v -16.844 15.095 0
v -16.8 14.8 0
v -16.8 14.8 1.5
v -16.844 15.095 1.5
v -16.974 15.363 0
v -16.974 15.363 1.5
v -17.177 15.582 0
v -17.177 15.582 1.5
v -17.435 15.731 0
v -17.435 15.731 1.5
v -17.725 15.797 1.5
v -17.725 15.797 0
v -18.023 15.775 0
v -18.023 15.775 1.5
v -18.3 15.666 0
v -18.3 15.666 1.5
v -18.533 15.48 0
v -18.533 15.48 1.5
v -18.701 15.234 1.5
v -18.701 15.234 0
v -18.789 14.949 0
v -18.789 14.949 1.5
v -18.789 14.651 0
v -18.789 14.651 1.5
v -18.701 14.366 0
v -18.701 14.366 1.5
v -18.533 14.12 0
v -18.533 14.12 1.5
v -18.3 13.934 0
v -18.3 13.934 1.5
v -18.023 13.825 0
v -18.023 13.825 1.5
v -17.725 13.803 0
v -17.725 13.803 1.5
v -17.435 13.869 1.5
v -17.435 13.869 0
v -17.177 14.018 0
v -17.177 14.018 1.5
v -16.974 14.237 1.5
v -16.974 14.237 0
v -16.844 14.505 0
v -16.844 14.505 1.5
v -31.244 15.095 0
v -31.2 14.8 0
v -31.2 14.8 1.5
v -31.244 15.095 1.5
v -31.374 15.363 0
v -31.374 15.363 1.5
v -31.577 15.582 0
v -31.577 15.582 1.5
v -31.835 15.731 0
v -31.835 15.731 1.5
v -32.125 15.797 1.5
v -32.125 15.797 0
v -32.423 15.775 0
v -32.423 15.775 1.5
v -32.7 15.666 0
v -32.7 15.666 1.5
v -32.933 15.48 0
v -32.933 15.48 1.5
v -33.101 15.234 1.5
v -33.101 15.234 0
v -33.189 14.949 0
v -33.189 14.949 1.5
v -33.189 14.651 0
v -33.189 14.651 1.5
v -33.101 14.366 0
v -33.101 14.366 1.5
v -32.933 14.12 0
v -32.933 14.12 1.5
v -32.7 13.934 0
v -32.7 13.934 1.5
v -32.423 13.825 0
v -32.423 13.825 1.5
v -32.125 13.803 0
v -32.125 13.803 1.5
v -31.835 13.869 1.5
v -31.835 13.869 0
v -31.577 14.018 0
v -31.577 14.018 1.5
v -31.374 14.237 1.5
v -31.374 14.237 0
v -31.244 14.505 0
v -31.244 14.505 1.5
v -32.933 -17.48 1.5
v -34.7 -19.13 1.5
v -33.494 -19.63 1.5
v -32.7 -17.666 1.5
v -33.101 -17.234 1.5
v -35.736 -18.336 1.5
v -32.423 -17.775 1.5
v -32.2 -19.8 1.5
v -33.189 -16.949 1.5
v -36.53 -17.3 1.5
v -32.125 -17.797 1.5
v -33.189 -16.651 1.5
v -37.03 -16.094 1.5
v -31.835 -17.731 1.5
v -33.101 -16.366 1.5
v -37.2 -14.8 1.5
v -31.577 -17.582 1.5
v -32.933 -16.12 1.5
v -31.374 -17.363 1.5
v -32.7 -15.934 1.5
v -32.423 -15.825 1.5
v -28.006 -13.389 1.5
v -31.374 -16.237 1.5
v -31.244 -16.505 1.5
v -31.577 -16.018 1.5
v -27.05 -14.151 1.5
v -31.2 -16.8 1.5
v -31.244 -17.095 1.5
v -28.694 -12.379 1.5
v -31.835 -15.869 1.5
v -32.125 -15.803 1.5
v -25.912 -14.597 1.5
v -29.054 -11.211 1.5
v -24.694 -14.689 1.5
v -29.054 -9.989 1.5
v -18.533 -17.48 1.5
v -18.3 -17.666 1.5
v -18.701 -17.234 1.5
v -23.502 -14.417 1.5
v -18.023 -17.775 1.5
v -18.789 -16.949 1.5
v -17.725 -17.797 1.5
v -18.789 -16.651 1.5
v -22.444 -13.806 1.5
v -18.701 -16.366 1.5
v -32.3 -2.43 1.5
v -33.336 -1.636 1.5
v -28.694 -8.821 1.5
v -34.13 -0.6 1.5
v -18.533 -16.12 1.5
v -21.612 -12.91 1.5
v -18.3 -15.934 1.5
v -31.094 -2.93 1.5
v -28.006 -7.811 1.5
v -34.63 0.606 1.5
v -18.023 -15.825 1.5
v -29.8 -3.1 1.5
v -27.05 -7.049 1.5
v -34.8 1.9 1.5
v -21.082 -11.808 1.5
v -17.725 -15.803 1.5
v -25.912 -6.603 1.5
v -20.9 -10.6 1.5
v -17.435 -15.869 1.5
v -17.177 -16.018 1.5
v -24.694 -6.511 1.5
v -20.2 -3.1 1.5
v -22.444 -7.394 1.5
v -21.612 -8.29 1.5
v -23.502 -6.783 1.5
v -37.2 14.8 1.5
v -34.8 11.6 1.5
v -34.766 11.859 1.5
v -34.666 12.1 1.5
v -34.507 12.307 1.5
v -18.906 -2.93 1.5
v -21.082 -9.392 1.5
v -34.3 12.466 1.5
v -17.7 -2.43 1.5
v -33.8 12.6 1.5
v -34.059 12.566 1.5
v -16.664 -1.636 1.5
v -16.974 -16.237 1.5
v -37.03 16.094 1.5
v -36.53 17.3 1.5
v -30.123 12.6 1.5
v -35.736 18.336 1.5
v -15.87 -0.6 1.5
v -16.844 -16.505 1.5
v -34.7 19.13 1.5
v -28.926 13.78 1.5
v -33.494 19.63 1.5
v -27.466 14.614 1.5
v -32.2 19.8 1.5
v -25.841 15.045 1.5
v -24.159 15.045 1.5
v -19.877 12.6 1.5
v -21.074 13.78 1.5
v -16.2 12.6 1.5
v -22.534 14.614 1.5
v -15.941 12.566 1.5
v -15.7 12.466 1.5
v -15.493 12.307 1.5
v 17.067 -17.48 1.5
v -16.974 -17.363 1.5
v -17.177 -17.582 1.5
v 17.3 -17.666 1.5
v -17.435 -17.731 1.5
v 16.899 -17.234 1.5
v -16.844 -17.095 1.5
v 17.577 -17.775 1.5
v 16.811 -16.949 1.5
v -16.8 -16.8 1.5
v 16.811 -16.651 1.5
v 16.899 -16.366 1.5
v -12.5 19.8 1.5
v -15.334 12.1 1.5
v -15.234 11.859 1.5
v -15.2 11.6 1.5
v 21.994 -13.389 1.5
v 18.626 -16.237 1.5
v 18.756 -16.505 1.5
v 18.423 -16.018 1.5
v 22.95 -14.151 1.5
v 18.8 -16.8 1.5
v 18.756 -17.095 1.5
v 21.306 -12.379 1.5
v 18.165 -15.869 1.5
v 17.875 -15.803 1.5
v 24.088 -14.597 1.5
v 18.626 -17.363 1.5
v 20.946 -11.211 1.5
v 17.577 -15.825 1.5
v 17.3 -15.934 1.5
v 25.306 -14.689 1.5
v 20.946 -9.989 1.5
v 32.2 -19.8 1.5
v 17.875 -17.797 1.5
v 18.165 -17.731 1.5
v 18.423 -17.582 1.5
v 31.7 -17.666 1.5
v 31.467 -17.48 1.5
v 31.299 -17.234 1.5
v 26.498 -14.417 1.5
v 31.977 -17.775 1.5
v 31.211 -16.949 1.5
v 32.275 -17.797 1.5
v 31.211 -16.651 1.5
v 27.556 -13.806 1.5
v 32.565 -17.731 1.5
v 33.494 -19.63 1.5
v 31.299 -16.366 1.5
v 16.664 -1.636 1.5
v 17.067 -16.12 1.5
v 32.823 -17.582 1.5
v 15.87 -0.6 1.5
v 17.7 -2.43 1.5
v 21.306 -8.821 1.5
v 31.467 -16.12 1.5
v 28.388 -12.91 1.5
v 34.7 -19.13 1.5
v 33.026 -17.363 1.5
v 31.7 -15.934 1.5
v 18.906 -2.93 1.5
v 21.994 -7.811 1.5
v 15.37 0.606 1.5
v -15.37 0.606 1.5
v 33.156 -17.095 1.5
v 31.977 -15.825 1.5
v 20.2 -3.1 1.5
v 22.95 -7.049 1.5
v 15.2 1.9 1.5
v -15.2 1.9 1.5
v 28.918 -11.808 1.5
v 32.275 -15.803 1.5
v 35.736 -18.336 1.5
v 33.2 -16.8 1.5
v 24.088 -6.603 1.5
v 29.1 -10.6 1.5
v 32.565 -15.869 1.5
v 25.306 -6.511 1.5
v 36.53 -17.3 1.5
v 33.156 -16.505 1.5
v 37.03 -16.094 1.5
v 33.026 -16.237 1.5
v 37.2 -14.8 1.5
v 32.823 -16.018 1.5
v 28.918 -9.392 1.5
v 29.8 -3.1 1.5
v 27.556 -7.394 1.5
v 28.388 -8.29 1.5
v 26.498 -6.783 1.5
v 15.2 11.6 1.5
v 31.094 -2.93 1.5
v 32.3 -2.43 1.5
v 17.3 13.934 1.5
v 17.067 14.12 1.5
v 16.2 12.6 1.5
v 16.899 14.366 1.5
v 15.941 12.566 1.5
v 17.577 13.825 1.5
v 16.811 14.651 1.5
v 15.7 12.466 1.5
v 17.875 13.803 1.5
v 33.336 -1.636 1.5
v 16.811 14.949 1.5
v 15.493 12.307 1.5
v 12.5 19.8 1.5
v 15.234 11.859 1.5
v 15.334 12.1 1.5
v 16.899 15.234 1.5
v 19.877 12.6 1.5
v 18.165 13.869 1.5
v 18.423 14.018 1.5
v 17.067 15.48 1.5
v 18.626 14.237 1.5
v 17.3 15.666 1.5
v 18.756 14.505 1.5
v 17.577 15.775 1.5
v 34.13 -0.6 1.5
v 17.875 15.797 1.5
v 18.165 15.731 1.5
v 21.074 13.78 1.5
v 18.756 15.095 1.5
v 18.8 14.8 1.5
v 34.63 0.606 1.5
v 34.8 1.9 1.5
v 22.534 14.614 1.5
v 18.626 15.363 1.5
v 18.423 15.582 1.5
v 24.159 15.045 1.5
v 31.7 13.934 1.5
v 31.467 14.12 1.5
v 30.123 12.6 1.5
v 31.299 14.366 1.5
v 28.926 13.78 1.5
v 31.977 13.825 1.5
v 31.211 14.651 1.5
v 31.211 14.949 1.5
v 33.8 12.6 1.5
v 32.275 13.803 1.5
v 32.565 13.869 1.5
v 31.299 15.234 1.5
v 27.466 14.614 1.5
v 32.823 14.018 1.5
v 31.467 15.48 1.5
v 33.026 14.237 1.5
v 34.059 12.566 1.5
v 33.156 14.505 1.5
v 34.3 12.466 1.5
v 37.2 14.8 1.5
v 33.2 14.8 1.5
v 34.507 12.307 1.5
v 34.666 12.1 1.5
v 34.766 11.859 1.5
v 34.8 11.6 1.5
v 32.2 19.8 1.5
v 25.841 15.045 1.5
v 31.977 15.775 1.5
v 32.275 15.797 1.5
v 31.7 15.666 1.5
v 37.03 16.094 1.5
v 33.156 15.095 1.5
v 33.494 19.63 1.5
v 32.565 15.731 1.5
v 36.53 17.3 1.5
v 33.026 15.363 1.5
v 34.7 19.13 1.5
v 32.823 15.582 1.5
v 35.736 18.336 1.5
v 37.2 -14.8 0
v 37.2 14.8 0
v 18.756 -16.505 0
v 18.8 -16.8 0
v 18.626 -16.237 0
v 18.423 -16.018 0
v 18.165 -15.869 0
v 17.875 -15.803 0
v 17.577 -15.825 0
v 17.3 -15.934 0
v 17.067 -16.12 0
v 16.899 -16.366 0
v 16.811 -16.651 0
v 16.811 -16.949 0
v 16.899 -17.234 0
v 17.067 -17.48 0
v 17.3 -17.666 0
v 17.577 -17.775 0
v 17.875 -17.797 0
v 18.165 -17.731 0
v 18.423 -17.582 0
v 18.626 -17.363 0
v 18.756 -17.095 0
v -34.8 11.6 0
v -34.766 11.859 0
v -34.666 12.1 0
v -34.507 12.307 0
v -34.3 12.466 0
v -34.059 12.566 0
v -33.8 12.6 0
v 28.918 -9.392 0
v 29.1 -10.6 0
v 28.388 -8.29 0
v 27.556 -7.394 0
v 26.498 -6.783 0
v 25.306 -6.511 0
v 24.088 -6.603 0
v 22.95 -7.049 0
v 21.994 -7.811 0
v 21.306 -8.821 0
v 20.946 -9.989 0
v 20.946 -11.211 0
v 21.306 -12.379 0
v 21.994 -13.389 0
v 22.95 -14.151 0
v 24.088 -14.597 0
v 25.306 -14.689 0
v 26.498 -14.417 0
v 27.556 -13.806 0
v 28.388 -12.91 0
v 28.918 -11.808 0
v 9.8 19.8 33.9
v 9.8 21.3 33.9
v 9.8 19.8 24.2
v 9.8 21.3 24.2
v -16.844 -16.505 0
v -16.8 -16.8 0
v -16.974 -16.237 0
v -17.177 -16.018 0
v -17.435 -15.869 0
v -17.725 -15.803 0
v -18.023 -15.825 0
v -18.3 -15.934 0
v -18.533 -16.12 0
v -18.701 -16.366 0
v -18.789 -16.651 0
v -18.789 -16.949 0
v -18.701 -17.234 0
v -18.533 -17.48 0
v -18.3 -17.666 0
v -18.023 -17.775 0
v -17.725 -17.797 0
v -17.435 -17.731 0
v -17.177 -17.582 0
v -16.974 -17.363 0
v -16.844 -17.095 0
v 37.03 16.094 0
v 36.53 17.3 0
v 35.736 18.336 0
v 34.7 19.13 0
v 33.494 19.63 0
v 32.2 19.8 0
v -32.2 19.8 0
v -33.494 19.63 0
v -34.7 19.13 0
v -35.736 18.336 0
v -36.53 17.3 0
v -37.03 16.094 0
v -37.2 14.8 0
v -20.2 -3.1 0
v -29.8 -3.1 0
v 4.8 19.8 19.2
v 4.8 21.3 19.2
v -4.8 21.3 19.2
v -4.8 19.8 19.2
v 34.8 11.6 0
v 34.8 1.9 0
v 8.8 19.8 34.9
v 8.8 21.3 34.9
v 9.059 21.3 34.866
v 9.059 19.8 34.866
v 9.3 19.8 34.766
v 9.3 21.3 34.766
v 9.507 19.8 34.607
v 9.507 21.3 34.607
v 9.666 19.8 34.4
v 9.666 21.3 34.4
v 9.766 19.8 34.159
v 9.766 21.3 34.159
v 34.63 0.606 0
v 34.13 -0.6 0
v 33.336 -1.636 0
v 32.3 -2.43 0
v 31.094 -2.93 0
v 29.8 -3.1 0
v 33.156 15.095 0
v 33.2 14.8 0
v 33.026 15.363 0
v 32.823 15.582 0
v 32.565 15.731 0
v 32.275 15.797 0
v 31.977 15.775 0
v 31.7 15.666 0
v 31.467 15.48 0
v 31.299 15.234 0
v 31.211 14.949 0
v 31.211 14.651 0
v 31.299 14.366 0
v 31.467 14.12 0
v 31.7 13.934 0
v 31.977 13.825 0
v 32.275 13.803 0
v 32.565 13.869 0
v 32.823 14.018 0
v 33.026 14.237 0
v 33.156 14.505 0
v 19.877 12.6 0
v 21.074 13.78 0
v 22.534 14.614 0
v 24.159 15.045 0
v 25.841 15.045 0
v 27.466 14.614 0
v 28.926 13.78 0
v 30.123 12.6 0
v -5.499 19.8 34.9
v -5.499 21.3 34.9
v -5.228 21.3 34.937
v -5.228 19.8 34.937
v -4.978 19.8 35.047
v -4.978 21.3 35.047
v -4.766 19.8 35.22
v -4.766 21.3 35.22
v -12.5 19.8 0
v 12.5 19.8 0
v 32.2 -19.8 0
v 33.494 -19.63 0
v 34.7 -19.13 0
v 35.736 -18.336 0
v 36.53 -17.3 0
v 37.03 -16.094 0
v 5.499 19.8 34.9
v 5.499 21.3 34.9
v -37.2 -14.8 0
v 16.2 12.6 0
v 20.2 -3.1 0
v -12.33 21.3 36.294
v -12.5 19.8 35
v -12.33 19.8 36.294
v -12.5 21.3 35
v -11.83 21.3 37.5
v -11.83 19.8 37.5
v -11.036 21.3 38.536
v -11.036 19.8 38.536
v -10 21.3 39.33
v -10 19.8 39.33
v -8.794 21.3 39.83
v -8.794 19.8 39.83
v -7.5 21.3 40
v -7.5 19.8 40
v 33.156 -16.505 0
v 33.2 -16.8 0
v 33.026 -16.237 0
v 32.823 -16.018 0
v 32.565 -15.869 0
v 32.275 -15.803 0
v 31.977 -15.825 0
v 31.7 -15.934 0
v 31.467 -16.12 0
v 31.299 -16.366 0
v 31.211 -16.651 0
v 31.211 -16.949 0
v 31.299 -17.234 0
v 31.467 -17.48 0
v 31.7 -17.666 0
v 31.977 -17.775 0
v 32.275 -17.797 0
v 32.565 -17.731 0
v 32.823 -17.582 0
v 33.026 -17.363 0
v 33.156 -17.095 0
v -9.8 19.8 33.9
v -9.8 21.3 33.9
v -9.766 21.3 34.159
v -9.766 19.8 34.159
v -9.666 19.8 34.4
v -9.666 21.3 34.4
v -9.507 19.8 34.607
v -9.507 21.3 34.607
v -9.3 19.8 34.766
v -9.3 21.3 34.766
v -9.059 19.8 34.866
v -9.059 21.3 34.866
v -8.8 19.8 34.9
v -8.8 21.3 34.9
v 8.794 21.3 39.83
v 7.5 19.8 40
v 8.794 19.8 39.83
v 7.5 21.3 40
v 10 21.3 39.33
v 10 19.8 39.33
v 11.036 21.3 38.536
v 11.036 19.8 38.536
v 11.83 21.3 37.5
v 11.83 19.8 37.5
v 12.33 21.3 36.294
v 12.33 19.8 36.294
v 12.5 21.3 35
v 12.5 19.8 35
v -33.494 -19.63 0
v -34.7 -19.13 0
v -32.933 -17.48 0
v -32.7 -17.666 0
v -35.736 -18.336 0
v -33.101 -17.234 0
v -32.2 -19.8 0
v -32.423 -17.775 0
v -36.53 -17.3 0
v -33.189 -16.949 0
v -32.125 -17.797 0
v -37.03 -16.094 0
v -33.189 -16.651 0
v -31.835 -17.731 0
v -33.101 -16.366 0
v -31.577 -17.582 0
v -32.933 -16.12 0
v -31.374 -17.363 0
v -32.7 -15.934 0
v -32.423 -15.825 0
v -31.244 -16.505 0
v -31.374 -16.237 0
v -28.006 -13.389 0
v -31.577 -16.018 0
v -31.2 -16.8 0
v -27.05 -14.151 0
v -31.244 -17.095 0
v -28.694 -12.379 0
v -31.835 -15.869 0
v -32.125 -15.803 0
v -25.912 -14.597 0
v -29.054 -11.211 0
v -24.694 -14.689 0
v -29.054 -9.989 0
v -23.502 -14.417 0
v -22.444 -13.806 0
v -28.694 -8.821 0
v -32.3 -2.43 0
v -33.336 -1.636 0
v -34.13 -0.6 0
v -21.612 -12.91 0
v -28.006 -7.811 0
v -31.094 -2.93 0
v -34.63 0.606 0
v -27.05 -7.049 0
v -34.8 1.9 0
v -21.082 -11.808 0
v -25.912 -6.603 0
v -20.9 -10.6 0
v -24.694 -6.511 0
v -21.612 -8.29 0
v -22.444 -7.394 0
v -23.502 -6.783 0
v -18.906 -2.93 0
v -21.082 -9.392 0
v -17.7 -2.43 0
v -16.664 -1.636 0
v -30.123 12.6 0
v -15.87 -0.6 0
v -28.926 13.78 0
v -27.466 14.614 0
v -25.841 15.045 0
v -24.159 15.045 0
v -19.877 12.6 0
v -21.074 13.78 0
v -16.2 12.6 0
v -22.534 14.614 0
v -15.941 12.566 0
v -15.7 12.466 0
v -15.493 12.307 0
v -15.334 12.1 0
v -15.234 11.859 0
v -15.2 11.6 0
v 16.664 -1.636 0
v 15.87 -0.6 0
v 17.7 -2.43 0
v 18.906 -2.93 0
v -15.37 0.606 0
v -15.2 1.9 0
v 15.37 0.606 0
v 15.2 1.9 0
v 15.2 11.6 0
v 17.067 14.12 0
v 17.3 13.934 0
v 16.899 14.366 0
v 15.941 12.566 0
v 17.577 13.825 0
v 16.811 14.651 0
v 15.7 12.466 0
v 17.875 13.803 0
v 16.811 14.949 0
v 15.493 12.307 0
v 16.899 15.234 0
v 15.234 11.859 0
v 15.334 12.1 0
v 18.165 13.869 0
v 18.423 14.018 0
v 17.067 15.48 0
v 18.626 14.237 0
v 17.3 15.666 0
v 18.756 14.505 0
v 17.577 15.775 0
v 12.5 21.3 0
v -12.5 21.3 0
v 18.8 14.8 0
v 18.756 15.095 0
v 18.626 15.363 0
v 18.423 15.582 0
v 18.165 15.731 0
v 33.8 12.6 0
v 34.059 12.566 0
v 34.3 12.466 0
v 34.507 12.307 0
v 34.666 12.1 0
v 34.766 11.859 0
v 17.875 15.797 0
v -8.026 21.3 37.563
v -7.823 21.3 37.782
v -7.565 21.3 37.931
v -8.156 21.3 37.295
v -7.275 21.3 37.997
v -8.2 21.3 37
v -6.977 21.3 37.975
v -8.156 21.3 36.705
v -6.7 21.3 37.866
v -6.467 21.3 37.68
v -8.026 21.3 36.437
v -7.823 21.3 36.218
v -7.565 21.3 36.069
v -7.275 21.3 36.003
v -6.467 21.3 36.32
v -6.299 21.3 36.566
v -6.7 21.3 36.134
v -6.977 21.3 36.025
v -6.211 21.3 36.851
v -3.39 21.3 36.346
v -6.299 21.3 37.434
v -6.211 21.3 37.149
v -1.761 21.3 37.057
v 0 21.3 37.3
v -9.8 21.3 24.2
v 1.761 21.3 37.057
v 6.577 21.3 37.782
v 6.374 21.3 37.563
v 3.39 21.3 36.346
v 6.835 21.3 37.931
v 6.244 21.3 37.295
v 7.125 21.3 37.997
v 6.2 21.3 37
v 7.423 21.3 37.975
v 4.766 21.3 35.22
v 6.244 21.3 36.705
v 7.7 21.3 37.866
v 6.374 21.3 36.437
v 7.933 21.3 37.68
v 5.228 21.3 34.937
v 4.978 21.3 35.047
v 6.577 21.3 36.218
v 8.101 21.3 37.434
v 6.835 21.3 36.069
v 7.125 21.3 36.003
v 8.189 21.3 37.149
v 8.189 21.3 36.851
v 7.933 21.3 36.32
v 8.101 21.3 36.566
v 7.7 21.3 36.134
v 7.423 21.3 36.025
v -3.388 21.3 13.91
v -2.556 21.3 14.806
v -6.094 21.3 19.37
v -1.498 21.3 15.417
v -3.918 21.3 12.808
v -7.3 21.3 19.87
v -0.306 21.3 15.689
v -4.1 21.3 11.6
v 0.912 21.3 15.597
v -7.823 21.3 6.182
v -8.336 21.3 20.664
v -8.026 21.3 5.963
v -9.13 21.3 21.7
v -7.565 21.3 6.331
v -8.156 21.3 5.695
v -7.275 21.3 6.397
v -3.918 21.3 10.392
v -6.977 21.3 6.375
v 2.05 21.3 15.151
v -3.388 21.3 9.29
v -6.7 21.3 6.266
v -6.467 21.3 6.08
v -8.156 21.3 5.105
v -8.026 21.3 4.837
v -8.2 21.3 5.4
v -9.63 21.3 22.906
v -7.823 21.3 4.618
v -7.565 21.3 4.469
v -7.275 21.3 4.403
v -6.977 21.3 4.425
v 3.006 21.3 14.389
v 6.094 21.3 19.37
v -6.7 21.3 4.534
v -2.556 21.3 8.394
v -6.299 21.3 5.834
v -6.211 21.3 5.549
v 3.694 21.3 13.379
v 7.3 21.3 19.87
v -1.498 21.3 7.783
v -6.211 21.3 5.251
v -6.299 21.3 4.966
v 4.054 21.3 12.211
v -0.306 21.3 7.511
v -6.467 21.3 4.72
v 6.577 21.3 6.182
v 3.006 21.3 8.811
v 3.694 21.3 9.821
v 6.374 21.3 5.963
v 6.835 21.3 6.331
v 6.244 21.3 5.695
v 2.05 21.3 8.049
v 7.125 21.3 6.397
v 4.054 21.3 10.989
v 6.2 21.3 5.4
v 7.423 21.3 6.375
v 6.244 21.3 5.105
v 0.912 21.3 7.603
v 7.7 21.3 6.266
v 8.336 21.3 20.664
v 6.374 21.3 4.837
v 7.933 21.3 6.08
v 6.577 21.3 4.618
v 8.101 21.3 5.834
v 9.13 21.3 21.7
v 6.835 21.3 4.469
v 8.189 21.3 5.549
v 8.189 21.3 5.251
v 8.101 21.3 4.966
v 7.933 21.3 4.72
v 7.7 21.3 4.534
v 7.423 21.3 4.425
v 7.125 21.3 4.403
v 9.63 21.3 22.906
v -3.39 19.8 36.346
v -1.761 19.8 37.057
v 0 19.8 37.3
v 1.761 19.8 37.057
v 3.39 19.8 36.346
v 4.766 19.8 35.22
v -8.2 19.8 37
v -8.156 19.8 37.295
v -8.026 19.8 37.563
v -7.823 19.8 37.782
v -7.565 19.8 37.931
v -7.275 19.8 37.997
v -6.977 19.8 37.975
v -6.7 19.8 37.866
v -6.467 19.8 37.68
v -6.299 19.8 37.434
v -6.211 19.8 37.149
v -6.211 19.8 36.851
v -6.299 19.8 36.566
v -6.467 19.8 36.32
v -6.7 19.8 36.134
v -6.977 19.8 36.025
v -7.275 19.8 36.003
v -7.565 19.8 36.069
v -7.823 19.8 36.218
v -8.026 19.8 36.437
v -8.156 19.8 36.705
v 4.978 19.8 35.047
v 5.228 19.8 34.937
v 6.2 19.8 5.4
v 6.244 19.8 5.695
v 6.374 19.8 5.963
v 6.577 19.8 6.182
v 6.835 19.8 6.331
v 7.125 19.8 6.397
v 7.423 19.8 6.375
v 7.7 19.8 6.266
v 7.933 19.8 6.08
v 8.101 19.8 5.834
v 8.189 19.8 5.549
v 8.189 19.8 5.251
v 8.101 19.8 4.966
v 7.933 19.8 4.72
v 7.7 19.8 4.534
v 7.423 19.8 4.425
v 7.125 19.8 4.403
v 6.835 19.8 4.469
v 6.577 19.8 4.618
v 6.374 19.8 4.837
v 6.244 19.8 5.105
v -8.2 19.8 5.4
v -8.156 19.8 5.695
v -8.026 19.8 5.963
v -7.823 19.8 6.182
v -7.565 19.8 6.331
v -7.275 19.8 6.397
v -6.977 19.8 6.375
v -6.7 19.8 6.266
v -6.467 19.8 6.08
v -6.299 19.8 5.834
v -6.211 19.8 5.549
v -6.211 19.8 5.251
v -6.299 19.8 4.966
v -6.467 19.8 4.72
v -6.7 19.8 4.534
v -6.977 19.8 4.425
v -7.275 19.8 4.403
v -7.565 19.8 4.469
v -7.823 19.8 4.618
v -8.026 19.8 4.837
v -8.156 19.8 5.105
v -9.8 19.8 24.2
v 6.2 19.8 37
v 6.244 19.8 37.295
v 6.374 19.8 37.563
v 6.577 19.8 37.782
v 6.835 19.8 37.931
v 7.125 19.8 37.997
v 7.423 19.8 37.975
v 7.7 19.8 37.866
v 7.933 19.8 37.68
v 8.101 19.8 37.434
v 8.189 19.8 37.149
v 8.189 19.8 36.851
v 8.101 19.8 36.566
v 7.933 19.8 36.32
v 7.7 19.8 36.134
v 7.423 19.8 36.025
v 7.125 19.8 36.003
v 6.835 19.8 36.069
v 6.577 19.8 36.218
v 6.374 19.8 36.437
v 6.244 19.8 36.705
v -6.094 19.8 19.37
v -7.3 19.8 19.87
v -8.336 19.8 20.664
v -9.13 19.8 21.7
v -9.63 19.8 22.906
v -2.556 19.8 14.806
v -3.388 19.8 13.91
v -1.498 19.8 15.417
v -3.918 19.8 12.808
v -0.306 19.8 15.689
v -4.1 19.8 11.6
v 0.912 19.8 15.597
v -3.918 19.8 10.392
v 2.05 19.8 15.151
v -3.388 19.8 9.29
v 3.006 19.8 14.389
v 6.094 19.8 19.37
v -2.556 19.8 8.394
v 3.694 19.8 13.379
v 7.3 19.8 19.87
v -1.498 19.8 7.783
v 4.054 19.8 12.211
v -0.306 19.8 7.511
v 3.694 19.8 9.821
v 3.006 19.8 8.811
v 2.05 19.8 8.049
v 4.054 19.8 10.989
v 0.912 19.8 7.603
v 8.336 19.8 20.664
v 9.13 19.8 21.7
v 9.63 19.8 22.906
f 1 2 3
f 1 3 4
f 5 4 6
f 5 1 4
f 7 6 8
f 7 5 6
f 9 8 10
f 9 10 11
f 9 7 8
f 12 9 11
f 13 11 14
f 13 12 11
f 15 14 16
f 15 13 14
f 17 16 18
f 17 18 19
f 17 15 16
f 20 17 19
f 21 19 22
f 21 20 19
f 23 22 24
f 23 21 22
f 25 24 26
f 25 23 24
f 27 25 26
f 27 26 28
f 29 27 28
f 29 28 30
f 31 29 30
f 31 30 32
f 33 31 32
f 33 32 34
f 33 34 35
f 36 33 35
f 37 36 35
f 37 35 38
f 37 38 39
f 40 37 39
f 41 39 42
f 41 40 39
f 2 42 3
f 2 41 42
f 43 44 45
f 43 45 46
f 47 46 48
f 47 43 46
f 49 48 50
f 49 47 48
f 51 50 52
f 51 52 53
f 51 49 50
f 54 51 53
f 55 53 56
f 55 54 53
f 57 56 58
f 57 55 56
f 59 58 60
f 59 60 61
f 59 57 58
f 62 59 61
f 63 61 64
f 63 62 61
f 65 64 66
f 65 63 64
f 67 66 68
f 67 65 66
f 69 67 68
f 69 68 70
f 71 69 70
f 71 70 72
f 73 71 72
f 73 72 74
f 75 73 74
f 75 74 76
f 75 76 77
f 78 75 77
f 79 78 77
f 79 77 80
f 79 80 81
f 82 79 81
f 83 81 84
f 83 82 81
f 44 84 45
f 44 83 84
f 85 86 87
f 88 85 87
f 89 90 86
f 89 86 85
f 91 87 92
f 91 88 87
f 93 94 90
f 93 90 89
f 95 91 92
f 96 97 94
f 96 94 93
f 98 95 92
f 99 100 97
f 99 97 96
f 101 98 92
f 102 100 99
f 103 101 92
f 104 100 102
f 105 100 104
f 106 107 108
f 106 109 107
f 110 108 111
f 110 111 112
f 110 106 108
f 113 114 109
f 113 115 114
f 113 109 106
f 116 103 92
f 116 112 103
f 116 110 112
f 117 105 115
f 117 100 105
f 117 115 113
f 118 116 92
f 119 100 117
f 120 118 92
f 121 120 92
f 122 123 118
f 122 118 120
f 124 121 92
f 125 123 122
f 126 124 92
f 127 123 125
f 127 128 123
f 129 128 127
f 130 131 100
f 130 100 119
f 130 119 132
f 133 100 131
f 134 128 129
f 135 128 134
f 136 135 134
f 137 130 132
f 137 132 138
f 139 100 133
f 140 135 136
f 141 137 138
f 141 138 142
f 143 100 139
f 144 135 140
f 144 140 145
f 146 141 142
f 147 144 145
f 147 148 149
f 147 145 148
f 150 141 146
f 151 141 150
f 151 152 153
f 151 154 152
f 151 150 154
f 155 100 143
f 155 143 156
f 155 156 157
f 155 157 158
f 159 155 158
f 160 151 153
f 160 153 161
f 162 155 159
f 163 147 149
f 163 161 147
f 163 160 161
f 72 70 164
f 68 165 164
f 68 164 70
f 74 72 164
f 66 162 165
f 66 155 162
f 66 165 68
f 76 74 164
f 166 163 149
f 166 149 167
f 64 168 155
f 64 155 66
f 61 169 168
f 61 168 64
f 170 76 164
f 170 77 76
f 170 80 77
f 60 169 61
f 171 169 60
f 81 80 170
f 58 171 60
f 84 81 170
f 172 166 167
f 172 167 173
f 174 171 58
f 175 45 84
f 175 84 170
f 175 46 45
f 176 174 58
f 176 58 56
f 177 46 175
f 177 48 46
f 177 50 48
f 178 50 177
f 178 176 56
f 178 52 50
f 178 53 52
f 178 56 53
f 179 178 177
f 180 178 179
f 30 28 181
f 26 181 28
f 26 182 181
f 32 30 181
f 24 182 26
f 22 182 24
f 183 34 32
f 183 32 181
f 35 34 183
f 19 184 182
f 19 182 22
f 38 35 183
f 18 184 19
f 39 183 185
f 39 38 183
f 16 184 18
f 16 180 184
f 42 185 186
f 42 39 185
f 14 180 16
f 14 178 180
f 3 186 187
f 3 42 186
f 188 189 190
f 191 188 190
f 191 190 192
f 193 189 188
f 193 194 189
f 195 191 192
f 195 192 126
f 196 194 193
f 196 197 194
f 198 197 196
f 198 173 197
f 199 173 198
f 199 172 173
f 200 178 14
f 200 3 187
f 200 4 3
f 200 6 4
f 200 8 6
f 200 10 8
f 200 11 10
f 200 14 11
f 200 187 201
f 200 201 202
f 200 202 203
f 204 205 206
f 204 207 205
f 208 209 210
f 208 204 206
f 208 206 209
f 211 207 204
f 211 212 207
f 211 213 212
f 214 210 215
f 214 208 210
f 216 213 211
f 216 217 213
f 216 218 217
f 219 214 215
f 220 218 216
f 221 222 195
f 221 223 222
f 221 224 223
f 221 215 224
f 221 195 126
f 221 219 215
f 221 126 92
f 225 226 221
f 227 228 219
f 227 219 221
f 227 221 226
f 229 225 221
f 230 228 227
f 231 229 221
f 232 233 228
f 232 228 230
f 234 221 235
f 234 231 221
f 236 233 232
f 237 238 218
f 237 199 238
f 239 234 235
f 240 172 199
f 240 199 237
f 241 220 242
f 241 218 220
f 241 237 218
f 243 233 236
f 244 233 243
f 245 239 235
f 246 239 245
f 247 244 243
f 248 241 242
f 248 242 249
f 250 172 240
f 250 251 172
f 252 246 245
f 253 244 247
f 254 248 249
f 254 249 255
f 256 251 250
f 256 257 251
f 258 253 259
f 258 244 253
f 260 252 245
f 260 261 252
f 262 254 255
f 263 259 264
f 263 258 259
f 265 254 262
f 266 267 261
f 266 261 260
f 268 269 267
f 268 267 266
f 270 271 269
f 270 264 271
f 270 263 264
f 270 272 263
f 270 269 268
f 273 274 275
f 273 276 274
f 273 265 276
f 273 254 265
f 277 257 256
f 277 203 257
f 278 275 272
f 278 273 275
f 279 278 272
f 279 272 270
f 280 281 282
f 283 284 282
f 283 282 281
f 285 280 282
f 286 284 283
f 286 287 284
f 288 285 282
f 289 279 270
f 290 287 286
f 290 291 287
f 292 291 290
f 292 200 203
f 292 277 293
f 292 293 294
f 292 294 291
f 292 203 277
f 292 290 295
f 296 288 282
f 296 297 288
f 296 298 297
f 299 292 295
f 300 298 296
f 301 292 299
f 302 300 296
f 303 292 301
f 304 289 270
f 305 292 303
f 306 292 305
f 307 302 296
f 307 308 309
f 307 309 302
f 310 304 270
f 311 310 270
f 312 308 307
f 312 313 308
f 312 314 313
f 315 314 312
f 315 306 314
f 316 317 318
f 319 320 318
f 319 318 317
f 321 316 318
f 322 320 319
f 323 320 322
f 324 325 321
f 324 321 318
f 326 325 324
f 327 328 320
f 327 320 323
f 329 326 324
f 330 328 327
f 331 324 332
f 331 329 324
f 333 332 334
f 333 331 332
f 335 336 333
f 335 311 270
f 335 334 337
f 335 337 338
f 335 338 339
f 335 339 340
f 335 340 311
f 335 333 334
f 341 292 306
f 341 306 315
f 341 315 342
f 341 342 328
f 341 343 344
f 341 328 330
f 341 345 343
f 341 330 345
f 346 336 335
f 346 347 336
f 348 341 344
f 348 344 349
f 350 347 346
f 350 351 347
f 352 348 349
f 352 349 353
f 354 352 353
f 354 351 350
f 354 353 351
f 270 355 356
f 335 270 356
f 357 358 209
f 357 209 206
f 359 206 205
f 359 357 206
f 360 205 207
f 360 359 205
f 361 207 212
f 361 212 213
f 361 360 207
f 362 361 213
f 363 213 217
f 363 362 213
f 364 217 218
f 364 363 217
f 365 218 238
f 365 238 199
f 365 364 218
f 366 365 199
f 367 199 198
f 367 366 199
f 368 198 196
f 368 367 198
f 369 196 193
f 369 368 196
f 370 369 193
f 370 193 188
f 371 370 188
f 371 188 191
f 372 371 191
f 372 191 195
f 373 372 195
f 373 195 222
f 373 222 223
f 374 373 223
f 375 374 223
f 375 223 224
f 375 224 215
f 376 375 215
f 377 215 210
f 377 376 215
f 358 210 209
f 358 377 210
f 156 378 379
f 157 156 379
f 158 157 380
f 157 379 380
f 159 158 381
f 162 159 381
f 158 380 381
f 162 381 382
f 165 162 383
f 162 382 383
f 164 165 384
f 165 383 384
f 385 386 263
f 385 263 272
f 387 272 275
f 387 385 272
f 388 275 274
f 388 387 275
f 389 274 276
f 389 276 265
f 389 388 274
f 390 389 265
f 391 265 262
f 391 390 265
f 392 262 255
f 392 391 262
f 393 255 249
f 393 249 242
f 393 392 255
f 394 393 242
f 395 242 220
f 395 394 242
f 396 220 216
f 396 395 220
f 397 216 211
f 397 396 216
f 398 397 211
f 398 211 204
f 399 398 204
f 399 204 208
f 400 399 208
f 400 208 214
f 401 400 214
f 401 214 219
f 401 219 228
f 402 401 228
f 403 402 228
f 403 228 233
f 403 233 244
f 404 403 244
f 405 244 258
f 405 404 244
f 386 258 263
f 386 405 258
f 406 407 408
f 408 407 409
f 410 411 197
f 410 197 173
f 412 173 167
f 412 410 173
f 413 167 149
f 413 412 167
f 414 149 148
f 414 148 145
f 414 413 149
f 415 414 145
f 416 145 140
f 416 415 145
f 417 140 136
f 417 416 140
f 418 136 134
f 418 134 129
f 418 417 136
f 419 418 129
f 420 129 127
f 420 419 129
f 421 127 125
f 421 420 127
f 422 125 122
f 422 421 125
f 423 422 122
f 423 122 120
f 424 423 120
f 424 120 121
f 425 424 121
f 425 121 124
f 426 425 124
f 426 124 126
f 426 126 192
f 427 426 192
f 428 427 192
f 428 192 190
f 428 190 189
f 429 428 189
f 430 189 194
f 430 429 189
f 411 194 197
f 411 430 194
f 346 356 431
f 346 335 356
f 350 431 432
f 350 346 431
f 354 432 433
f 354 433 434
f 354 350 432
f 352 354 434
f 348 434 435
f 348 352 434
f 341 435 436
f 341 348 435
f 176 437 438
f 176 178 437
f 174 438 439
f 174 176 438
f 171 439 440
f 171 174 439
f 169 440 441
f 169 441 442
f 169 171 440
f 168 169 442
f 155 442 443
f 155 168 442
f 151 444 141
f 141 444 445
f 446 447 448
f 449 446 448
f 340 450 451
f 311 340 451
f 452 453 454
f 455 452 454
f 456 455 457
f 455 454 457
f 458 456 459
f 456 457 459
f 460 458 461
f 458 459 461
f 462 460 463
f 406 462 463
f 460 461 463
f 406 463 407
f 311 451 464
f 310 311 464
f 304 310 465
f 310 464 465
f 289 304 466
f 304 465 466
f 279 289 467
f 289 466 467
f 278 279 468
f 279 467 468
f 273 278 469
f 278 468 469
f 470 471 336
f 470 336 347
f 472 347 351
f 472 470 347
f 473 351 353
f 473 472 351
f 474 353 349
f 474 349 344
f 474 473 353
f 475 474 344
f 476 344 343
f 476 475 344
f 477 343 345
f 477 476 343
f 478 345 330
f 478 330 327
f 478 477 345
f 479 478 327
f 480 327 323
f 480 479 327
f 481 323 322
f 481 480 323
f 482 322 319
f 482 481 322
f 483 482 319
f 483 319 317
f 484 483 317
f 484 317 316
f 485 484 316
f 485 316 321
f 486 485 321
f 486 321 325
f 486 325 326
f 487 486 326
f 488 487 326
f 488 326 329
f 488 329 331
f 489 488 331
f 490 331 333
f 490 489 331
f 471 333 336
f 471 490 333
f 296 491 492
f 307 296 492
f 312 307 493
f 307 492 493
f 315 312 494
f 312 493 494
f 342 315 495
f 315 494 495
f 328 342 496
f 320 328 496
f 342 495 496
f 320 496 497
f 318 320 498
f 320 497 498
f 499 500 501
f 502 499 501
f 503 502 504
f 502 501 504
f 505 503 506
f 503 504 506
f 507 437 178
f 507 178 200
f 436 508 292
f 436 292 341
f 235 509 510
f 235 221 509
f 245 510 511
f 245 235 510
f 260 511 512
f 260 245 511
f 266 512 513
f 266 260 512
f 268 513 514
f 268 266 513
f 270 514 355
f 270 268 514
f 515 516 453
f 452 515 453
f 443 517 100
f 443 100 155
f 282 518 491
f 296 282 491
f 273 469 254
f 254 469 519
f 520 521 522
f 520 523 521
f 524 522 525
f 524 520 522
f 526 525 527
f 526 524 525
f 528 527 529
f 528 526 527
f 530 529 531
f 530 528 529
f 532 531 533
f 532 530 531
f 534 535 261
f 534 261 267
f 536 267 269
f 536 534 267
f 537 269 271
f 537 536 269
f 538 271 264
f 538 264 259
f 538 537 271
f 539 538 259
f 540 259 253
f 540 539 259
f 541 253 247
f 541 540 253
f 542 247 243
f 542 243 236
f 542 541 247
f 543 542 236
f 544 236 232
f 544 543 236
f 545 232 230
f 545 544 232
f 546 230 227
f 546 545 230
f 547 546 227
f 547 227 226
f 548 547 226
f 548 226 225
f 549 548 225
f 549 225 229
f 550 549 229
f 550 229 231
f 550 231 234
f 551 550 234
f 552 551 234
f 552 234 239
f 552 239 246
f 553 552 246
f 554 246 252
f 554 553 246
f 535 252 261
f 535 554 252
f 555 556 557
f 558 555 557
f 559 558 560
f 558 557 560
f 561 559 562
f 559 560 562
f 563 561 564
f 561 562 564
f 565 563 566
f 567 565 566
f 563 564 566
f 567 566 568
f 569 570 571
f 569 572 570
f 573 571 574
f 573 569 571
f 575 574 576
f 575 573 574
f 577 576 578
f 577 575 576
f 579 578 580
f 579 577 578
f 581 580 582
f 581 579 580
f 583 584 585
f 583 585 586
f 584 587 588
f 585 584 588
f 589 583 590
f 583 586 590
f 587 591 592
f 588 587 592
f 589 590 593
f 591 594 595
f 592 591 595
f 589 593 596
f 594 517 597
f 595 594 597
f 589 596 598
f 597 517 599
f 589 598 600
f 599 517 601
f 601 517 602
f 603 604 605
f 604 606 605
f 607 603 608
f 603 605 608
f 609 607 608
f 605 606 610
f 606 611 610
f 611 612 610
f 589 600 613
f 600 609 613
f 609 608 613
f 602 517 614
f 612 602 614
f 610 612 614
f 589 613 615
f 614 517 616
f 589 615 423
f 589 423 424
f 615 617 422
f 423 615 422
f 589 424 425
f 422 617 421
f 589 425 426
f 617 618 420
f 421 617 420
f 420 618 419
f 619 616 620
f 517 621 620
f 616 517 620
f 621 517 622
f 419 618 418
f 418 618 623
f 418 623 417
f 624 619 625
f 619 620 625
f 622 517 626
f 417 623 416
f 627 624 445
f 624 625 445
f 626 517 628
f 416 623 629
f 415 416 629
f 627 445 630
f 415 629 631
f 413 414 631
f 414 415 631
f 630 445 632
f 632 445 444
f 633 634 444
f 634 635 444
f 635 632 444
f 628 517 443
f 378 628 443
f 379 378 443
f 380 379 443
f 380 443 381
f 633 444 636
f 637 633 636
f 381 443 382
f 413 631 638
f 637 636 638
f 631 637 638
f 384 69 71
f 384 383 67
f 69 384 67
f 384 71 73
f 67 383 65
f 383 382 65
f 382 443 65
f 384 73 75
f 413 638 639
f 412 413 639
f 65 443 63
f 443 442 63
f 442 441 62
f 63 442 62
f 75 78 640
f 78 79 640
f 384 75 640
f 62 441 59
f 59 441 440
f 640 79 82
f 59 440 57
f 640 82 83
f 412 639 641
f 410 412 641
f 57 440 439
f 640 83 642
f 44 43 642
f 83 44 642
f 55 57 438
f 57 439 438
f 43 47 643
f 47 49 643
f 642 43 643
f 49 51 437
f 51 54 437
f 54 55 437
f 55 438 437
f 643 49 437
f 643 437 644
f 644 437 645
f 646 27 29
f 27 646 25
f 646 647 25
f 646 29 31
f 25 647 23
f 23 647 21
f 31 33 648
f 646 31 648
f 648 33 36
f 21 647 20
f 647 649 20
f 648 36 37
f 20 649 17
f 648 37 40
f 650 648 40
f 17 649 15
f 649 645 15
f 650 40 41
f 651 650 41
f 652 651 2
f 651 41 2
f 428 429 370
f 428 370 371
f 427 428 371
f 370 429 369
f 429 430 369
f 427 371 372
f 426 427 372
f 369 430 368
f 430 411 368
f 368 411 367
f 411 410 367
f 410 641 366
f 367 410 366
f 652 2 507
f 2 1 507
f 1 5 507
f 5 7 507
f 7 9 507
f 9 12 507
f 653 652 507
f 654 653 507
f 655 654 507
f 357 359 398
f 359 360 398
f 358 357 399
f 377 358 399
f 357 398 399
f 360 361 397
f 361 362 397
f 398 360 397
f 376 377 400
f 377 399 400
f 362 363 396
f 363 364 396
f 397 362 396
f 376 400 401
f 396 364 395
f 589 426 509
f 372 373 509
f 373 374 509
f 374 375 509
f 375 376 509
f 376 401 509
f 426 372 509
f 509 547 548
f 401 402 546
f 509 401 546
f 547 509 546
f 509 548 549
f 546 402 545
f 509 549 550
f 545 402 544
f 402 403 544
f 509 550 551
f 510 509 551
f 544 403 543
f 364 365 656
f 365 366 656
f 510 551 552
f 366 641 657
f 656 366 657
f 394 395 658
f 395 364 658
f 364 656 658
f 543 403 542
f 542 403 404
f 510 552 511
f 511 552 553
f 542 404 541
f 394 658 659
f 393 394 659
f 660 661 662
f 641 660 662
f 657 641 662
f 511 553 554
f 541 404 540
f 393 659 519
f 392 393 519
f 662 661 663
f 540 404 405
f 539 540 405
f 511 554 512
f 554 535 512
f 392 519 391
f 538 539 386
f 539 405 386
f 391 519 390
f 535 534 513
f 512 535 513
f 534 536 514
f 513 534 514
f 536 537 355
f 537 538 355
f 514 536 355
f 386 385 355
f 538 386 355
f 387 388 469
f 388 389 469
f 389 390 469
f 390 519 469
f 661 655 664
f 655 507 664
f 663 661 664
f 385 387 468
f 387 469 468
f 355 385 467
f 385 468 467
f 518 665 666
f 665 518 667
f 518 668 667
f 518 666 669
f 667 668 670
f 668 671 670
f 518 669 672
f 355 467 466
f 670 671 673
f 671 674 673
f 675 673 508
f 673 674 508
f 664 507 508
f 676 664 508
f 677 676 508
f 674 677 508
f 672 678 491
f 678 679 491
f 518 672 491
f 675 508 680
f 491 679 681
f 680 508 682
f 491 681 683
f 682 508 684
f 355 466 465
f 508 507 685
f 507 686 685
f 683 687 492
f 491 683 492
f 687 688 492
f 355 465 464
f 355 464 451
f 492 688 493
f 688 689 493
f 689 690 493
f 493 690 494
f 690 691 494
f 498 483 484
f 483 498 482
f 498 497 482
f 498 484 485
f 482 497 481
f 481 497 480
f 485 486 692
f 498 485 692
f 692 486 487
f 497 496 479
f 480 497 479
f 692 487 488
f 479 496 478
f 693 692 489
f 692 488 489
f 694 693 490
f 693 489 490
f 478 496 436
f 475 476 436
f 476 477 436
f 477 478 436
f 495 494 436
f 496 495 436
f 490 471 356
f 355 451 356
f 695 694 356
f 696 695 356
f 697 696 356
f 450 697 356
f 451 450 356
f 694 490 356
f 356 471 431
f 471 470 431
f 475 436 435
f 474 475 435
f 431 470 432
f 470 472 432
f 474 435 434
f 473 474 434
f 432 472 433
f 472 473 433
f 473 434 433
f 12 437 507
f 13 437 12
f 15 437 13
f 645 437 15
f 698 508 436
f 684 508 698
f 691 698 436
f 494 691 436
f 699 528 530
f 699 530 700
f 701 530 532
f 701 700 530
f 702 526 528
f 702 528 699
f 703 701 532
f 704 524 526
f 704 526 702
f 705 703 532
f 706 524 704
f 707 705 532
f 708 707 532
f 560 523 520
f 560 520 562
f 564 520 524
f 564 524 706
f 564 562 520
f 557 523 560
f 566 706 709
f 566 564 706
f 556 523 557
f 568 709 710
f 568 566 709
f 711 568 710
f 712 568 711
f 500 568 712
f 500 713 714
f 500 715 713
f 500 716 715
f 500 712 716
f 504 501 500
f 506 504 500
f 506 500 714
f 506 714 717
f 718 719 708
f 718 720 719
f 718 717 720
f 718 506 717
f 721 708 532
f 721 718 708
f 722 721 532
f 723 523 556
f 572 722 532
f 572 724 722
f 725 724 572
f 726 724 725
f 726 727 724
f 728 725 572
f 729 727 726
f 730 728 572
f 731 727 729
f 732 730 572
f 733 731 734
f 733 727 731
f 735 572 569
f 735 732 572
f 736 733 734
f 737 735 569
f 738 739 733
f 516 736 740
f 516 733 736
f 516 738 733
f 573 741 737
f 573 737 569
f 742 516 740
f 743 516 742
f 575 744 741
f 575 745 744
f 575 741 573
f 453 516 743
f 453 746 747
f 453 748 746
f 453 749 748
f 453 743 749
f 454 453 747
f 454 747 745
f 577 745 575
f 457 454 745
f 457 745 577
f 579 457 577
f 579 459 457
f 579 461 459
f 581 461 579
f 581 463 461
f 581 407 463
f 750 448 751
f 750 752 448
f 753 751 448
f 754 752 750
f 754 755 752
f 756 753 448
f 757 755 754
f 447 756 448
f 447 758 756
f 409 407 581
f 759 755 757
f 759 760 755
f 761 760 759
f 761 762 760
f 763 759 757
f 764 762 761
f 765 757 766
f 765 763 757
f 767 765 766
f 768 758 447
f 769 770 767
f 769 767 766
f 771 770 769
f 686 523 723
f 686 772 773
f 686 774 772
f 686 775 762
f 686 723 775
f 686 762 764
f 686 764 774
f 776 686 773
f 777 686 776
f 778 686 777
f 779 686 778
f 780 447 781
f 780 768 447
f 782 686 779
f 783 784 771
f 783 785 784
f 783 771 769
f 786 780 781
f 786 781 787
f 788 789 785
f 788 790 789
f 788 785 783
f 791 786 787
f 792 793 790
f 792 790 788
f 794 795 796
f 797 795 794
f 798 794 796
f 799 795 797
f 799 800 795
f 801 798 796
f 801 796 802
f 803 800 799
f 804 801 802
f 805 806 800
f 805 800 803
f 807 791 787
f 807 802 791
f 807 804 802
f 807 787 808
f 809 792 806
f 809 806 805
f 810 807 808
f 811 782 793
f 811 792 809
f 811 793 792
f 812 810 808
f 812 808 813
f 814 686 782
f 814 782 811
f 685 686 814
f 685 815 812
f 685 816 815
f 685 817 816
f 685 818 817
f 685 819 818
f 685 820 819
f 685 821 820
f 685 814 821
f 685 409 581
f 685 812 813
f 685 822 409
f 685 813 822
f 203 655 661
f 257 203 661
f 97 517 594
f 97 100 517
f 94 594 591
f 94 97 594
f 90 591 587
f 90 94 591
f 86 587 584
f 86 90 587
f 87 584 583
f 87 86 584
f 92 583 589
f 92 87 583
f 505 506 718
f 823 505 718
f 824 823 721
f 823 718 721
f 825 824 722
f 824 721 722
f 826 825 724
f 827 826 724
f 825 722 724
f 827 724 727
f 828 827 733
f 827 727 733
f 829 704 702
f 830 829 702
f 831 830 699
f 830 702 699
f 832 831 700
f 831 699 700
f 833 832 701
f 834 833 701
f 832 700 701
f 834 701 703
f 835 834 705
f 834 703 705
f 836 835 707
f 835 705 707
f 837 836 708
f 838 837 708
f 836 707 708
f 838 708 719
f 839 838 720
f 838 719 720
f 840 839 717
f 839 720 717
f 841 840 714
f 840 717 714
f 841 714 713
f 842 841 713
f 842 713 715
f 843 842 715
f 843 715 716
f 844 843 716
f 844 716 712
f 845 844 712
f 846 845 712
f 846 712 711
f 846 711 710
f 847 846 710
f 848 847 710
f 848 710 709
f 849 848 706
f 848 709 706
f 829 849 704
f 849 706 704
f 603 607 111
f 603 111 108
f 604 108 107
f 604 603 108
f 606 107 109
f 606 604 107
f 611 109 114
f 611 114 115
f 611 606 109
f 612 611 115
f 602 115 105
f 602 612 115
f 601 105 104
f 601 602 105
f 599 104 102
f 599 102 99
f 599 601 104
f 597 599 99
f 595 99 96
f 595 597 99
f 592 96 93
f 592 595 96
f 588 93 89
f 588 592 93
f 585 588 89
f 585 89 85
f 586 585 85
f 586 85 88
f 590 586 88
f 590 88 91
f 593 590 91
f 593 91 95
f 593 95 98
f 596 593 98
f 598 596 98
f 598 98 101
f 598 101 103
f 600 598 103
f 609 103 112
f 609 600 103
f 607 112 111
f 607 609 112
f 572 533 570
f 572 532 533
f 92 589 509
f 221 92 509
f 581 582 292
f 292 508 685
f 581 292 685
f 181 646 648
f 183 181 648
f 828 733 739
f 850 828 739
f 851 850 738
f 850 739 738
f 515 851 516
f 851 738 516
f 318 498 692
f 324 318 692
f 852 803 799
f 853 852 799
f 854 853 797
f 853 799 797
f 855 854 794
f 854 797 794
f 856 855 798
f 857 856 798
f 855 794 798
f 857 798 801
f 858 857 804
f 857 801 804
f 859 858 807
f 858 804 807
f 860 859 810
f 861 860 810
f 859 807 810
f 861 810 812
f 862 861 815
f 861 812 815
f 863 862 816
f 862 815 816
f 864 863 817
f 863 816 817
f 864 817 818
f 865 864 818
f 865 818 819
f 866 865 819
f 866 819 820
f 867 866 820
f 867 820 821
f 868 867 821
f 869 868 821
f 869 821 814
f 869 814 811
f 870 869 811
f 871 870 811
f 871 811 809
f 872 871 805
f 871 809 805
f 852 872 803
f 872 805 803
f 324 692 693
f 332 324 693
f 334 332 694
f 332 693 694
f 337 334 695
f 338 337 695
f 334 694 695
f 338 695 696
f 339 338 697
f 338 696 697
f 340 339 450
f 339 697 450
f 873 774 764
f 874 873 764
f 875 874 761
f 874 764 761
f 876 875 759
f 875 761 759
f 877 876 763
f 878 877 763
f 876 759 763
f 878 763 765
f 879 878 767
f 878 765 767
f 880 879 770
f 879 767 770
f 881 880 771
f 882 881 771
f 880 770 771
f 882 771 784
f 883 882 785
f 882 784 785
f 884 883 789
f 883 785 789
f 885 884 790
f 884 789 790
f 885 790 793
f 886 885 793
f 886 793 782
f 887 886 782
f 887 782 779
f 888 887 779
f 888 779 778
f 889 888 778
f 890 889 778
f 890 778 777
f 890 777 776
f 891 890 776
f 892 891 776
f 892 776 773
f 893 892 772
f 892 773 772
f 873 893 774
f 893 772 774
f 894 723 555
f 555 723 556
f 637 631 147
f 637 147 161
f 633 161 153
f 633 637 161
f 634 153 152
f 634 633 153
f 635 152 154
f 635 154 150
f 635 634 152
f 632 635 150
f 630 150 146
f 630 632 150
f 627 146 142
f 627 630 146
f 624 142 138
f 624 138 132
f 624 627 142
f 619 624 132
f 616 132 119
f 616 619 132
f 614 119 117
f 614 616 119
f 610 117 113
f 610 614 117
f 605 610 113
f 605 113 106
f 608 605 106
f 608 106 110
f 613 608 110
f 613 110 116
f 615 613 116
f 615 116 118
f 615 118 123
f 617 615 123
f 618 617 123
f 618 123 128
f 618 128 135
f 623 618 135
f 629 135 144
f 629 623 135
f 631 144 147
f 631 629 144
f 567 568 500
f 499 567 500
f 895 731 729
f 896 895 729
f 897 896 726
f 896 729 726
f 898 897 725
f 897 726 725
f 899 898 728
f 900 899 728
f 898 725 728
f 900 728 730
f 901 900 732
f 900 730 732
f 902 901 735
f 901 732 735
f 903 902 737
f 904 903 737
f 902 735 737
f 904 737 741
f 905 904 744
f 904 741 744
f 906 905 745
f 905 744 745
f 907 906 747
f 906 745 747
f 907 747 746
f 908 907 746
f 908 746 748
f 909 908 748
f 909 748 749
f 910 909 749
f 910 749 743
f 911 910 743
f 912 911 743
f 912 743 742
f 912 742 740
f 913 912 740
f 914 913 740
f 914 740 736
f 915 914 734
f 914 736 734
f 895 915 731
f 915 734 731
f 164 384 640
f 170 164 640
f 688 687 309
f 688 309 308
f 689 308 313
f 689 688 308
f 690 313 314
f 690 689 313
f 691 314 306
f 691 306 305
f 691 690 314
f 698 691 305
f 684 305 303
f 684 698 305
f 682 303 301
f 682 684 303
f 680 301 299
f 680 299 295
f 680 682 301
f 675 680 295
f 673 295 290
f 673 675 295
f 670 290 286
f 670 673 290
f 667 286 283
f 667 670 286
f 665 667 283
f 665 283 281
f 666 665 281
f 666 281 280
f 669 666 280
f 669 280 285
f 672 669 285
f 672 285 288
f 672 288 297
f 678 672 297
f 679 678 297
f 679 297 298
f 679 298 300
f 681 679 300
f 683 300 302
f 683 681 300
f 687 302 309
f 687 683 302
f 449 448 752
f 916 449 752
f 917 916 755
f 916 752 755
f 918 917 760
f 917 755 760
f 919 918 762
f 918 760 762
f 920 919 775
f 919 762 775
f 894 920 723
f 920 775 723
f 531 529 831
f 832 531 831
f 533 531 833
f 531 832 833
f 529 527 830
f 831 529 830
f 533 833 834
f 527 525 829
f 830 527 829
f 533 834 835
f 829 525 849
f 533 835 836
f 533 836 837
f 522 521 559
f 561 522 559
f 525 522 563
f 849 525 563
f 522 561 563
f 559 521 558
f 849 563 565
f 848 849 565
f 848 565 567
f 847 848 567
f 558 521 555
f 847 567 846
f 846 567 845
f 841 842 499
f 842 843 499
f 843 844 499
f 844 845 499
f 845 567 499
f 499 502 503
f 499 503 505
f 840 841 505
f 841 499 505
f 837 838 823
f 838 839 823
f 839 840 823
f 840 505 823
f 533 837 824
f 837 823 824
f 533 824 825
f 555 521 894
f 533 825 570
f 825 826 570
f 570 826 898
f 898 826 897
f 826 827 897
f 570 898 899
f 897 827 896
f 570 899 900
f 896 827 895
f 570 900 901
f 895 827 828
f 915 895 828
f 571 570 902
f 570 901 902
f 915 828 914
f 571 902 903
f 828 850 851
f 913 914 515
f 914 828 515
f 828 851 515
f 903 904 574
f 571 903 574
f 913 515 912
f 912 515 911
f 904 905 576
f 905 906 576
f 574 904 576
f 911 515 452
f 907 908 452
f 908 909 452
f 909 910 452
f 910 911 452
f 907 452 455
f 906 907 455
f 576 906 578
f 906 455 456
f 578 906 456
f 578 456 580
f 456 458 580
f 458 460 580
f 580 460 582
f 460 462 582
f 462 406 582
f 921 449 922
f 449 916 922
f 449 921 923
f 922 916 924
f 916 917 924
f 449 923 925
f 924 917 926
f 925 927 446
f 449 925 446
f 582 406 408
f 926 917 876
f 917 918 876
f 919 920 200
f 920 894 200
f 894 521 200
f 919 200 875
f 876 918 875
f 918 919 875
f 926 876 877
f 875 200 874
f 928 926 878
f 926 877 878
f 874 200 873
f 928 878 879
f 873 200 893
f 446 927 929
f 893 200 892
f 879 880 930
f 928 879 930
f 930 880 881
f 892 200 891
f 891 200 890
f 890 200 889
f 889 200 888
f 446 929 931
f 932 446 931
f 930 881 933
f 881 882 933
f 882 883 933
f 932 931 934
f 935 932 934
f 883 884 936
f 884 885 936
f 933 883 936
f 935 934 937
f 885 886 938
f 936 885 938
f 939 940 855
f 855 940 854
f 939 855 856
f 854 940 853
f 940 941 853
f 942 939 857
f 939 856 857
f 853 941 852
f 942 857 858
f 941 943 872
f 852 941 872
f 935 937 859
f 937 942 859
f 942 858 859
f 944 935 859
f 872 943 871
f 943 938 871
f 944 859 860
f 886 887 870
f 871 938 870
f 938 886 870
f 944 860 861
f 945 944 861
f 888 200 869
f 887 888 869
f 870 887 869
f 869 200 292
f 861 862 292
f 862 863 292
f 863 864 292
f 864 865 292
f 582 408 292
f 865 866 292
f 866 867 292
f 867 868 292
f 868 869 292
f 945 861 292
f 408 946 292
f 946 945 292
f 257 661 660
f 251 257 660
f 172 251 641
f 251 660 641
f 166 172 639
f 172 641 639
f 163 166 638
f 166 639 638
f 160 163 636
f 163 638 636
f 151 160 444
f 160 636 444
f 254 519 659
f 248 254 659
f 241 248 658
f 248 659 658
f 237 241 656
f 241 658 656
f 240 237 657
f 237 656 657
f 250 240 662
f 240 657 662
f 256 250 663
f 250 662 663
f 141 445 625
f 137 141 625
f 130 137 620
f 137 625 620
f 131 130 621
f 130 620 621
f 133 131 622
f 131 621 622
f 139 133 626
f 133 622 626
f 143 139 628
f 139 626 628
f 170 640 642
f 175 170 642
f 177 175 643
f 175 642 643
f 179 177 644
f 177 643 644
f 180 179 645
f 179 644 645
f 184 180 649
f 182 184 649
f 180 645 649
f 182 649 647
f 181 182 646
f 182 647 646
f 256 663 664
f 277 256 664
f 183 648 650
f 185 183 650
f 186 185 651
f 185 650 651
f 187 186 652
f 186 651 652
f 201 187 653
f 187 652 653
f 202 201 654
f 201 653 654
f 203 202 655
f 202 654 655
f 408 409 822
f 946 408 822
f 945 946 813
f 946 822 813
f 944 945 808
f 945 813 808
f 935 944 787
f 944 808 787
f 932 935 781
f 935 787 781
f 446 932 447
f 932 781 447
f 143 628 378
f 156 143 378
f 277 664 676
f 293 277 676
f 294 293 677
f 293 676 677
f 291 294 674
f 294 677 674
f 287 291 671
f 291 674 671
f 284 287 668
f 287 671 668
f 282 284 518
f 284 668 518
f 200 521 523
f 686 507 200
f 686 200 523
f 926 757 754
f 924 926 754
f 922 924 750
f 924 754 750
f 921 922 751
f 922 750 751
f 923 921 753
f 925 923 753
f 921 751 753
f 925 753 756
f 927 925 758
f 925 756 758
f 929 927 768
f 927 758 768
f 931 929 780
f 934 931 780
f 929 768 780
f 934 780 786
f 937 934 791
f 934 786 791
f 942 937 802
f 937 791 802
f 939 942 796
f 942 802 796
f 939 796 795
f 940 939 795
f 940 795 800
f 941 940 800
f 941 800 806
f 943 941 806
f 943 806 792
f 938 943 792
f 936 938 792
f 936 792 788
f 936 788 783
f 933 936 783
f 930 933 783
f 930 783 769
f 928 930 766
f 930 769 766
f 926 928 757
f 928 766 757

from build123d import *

# Parameters (mm, degrees)
F0_W     = 74.4
F0_H     = 39.6
F0_R     = 1
F0_R_2   = 4.1
F1_DEPTH = 1.5
F2_W     = 25
F2_H     = 1.5
F3_DEPTH = 40
F4_R     = 1
F4_R_2   = 4.1
F5_DEPTH = 1.5
F6_R     = 5


with BuildPart() as f1:
    # F0 (on Top) → F1 (new body)
    with BuildSketch(Plane.XY):
        Rectangle(F0_W, F0_H)
        with Locations((-32.2, -16.8)):
            Circle(F0_R, mode=Mode.SUBTRACT)
        with Locations((-25, -10.6)):
            Circle(F0_R_2, mode=Mode.SUBTRACT)
        with Locations((-17.8, -16.8)):
            Circle(F0_R, mode=Mode.SUBTRACT)
        with Locations((17.8, -16.8)):
            Circle(F0_R, mode=Mode.SUBTRACT)
        with Locations((32.2, -16.8)):
            Circle(F0_R, mode=Mode.SUBTRACT)
        with Locations((25, -10.6)):
            Circle(F0_R_2, mode=Mode.SUBTRACT)
        with BuildLine():
            ThreePointArc((-34.8, 11.6), (-34.507107, 12.307107), (-33.8, 12.6))
            Line((-33.8, 12.6), (-30.123475, 12.6))
            ThreePointArc((-30.123475, 12.6), (-25, 15.1), (-19.876525, 12.6))
            Line((-19.876525, 12.6), (-16.2, 12.6))
            ThreePointArc((-16.2, 12.6), (-15.492893, 12.307107), (-15.2, 11.6))
            Line((-15.2, 11.6), (-15.2, 1.9))
            ThreePointArc((-15.2, 1.9), (-16.664466, -1.635534), (-20.2, -3.1))
            Line((-20.2, -3.1), (-29.8, -3.1))
            ThreePointArc((-29.8, -3.1), (-33.335534, -1.635534), (-34.8, 1.9))
            Line((-34.8, 1.9), (-34.8, 11.6))
        make_face(mode=Mode.SUBTRACT)
        with Locations((-32.2, 14.8)):
            Circle(F0_R, mode=Mode.SUBTRACT)
        with Locations((-17.8, 14.8)):
            Circle(F0_R, mode=Mode.SUBTRACT)
        with BuildLine():
            Line((15.2, 1.9), (15.2, 11.6))
            ThreePointArc((15.2, 11.6), (15.492893, 12.307107), (16.2, 12.6))
            Line((16.2, 12.6), (19.876525, 12.6))
            ThreePointArc((19.876525, 12.6), (25, 15.1), (30.123475, 12.6))
            Line((30.123475, 12.6), (33.8, 12.6))
            ThreePointArc((33.8, 12.6), (34.507107, 12.307107), (34.8, 11.6))
            Line((34.8, 11.6), (34.8, 1.9))
            ThreePointArc((34.8, 1.9), (33.335534, -1.635534), (29.8, -3.1))
            Line((29.8, -3.1), (20.2, -3.1))
            ThreePointArc((20.2, -3.1), (16.664466, -1.635534), (15.2, 1.9))
        make_face(mode=Mode.SUBTRACT)
        with Locations((17.8, 14.8)):
            Circle(F0_R, mode=Mode.SUBTRACT)
        with Locations((32.2, 14.8)):
            Circle(F0_R, mode=Mode.SUBTRACT)
    extrude(amount=F1_DEPTH)

    # F2 (on Top) → F3 (join)
    with BuildSketch(Plane.XY):
        with Locations((0, 20.55)):
            Rectangle(F2_W, F2_H)
    extrude(amount=F3_DEPTH)

    # F4 (on face) → F5 (cut, through all)
    with BuildSketch(Plane(origin=(0, 21.3, 0), x_dir=(-1, 0, 0), z_dir=(0, 1, 0))):
        with Locations((7.2, 37)):
            Circle(F4_R)
        with Locations((7.2, 5.4)):
            Circle(F4_R)
        with Locations((0, 11.6)):
            Circle(F4_R_2)
        with BuildLine():
            ThreePointArc((9.8, 33.9), (9.507107, 34.607107), (8.8, 34.9))
            Line((8.8, 34.9), (5.499091, 34.9))
            ThreePointArc((5.499091, 34.9), (5.099091, 34.983485), (4.765879, 35.22))
            ThreePointArc((4.765879, 35.22), (0, 37.3), (-4.765879, 35.22))
            ThreePointArc((-4.765879, 35.22), (-5.099091, 34.983485), (-5.499091, 34.9))
            Line((-5.499091, 34.9), (-8.8, 34.9))
            ThreePointArc((-8.8, 34.9), (-9.507107, 34.607107), (-9.8, 33.9))
            Line((-9.8, 33.9), (-9.8, 24.2))
            ThreePointArc((-9.8, 24.2), (-8.335534, 20.664466), (-4.8, 19.2))
            Line((-4.8, 19.2), (4.8, 19.2))
            ThreePointArc((4.8, 19.2), (8.335534, 20.664466), (9.8, 24.2))
            Line((9.8, 24.2), (9.8, 33.9))
        make_face()
        with Locations((-7.2, 37)):
            Circle(F4_R)
        with Locations((-7.2, 5.4)):
            Circle(F4_R)
    extrude(amount=-F5_DEPTH, mode=Mode.SUBTRACT)

    # F6
    f6_edges = [f1.edges().sort_by_distance(p)[0] for p in [
        (-37.2, 19.8, 0.75),
        (-37.2, -19.8, 0.75),
        (37.2, 19.8, 0.75),
        (37.2, -19.8, 0.75),
        (-12.5, 20.55, 40),
        (12.5, 20.55, 40),
    ]]
    fillet(f6_edges, radius=F6_R)


solid = f1.part
